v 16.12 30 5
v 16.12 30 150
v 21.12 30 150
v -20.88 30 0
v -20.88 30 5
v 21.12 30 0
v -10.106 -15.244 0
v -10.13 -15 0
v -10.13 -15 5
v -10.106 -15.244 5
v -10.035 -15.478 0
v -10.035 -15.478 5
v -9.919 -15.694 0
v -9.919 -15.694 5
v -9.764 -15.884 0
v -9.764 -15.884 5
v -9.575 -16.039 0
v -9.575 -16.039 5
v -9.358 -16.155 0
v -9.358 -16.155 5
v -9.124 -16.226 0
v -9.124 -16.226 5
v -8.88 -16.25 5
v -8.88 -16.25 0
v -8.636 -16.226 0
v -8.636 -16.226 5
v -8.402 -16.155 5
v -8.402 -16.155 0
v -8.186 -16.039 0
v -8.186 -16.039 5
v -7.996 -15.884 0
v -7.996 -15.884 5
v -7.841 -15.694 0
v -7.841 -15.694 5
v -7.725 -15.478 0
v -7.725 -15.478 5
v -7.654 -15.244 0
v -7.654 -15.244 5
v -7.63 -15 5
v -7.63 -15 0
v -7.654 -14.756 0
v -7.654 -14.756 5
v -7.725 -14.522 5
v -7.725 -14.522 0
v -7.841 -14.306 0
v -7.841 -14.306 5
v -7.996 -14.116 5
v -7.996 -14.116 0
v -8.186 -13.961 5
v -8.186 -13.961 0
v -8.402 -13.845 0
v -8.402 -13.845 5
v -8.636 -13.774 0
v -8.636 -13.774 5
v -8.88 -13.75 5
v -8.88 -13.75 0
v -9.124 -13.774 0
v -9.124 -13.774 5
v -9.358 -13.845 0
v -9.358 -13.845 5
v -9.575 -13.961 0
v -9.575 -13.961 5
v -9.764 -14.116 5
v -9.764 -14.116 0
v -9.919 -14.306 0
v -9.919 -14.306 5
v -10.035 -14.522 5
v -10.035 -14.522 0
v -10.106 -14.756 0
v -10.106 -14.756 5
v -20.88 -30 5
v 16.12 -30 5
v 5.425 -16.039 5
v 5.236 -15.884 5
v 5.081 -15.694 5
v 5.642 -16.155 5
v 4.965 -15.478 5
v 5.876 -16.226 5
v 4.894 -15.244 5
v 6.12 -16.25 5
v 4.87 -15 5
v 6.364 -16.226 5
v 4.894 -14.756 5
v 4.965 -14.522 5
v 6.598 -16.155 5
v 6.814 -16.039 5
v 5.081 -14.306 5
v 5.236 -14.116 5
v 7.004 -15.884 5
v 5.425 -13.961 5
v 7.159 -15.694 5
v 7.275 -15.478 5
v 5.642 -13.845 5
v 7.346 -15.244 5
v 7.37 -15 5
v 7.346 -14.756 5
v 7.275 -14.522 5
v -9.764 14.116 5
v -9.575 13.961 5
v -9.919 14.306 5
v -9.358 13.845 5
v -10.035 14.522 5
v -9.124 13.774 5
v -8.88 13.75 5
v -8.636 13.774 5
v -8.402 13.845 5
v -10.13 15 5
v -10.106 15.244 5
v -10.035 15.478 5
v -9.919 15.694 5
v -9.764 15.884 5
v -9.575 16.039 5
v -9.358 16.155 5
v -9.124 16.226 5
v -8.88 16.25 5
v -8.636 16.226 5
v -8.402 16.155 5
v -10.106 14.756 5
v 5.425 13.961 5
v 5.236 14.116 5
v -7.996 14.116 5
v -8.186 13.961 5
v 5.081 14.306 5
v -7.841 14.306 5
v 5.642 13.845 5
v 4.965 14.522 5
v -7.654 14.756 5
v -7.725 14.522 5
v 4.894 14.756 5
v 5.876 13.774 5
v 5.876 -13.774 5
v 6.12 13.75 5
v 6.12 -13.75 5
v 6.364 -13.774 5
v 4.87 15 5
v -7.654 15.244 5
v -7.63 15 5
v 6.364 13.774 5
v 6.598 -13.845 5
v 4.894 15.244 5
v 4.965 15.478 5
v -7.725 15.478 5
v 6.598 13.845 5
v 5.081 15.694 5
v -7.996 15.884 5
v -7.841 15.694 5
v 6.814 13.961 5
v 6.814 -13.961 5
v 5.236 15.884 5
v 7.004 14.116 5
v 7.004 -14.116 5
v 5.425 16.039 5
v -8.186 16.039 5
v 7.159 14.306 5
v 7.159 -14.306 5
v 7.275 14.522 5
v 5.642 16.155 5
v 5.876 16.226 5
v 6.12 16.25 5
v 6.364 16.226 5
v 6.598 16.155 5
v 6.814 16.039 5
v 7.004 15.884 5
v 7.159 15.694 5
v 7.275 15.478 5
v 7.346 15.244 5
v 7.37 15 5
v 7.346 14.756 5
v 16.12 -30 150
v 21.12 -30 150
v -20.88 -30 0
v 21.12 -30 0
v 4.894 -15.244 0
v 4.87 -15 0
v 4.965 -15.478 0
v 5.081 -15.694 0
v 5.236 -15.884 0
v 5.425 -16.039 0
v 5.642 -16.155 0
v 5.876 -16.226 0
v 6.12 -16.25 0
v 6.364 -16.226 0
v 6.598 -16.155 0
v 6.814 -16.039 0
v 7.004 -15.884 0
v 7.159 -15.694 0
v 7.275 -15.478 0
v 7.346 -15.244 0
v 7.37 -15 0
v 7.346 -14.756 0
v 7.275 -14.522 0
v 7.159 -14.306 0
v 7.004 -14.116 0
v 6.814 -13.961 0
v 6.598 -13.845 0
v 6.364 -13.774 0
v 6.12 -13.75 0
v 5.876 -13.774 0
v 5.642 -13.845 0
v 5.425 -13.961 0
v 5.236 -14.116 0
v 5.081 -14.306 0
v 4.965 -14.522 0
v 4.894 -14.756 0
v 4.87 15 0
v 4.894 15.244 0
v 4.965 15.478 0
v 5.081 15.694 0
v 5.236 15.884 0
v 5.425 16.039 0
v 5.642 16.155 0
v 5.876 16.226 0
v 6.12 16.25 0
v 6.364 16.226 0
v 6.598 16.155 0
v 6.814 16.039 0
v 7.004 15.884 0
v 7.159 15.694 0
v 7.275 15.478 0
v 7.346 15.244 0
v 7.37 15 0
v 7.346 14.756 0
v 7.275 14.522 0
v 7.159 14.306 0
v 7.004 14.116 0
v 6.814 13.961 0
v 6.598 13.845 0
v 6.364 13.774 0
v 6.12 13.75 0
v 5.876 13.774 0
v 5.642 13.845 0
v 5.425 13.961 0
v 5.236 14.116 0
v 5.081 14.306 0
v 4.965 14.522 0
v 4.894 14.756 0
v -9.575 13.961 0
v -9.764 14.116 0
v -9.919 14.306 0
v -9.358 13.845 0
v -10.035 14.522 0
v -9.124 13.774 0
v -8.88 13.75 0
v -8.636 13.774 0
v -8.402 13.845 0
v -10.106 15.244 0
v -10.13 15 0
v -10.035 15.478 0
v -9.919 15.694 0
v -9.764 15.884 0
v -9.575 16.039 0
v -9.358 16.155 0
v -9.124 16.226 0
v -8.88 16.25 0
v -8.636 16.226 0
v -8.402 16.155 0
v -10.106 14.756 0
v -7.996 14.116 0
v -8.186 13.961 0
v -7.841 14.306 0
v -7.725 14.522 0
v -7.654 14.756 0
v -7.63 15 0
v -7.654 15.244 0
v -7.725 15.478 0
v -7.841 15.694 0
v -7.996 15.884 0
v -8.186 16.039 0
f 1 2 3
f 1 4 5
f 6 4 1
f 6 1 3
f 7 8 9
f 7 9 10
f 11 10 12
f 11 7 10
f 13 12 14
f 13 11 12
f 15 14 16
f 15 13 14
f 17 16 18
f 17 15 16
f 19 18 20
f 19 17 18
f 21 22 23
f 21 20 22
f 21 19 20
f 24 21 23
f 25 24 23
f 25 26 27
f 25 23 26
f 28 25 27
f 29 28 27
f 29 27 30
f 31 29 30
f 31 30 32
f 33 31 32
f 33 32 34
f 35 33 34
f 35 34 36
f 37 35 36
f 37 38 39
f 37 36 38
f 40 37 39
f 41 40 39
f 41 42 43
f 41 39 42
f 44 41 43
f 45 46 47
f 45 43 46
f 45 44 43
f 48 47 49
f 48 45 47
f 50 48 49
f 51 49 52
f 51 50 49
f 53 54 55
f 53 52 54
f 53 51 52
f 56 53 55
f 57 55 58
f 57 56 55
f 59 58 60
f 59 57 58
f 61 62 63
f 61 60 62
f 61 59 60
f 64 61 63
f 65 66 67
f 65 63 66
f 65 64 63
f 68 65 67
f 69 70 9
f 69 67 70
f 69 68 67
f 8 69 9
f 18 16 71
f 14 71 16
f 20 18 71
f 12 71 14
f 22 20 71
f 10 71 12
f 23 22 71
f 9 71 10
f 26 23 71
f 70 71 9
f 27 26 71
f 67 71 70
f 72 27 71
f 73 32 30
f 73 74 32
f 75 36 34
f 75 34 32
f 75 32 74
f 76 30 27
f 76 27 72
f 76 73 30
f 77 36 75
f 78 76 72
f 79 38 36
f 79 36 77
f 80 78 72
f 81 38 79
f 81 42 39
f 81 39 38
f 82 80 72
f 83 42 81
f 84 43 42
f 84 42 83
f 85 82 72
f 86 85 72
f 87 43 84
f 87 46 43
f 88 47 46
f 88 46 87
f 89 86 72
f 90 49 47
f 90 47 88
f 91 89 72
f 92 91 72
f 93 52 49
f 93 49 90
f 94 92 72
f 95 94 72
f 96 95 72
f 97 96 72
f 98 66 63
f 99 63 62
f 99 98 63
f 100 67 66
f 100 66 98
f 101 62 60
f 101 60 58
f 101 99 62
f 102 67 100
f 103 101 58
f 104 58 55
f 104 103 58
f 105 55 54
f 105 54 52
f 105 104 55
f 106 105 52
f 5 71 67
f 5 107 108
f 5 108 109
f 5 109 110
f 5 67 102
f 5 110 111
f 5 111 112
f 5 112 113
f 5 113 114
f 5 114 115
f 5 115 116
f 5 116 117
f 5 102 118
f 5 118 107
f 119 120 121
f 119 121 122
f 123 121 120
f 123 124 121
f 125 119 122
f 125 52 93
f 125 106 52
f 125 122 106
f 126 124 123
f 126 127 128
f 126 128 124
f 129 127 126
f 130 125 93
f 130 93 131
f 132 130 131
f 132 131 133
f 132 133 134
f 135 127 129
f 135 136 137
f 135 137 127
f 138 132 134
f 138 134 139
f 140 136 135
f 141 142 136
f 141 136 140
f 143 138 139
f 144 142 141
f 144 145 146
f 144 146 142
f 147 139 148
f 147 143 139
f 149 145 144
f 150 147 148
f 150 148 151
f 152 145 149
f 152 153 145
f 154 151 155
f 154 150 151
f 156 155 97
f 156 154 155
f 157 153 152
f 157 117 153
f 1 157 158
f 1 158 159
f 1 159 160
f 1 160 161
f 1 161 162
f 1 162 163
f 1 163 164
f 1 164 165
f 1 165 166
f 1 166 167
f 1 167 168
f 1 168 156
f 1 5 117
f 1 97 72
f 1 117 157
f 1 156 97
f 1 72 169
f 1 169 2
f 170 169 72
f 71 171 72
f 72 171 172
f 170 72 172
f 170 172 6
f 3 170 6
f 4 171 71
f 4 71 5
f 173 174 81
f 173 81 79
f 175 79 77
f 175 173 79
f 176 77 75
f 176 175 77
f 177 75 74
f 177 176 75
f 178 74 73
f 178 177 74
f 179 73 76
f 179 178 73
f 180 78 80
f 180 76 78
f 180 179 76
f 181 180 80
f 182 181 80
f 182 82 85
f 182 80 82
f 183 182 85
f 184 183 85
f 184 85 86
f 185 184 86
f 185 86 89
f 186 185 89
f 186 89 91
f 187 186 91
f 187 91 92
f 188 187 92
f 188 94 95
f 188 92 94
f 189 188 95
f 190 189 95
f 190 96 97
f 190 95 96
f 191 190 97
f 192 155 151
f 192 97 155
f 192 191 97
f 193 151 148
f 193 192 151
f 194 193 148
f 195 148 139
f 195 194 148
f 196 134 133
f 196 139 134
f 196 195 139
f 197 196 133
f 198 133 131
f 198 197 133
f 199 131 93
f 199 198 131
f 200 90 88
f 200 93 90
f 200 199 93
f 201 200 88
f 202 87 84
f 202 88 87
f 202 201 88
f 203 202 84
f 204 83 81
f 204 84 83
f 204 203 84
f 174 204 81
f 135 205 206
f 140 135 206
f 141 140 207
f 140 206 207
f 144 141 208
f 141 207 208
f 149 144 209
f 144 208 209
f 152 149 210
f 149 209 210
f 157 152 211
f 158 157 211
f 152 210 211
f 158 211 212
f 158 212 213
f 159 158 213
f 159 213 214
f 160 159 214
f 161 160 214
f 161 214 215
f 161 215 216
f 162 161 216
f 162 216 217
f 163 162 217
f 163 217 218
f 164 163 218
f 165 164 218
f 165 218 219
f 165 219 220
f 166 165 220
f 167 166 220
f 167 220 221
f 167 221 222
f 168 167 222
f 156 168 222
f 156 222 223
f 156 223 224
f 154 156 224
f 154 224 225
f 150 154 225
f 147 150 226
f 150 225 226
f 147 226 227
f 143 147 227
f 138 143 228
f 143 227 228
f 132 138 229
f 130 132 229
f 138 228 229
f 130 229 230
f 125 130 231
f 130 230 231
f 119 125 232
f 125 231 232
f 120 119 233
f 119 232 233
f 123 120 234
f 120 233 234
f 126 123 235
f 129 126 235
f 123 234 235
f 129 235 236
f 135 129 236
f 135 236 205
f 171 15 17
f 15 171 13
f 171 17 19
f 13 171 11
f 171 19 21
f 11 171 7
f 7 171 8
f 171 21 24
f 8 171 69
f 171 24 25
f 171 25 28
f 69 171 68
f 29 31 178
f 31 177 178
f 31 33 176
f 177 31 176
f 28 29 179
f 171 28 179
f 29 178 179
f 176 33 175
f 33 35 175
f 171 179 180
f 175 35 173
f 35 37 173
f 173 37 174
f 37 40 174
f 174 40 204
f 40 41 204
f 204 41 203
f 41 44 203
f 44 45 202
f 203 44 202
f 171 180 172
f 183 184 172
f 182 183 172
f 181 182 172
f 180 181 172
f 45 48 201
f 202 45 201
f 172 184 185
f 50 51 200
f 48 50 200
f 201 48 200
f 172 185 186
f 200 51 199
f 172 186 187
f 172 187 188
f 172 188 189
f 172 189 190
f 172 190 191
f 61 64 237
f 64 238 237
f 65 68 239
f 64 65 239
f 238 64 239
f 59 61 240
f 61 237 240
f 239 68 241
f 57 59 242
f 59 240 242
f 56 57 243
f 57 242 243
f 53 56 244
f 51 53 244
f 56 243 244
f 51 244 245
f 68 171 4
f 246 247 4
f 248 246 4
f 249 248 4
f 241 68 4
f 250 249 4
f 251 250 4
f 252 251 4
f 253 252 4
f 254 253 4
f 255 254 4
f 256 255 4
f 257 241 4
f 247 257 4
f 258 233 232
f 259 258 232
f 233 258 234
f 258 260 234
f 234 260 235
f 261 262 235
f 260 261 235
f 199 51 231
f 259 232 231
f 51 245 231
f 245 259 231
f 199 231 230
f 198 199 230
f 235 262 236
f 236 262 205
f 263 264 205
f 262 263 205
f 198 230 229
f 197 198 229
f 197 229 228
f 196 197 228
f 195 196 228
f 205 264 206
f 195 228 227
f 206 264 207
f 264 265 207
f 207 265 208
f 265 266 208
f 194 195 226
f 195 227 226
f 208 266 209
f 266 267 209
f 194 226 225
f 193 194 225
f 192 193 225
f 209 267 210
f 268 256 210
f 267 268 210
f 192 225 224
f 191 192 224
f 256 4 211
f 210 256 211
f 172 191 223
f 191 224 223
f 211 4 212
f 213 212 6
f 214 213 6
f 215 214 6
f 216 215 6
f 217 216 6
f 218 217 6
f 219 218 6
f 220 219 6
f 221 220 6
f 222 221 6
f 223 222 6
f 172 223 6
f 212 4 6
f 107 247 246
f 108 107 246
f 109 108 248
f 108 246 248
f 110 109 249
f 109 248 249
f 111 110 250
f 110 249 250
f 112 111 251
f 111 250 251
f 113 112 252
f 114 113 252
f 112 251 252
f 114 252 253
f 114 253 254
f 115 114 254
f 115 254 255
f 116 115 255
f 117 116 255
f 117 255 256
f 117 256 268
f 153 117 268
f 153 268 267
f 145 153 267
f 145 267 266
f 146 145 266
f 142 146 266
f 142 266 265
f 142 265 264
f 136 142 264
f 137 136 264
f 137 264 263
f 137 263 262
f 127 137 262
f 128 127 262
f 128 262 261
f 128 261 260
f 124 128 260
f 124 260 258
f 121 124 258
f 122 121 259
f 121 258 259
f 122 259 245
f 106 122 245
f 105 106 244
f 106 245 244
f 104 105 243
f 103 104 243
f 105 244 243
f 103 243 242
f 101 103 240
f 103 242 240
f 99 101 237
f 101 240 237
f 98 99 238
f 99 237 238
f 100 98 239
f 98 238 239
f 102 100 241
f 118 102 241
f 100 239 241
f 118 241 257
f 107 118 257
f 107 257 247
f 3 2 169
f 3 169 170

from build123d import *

# Parameters (mm, degrees)
SKETCH_1_W         = 37
SKETCH_1_H         = 60
EXTRUDE_1_DEPTH    = 5
SKETCH_1_3_W       = 5
SKETCH_1_3_H       = 60
EXTRUDE_2_DEPTH    = 150
HOLE_WIZARD_M3_1_D = 2.5


with BuildPart() as part:
    # 草图1 → 凸台-拉伸1 (new body)
    with BuildSketch(Plane.XY):
        with Locations((-2.380104714, 0)):
            Rectangle(SKETCH_1_W, SKETCH_1_H)
    extrude(amount=EXTRUDE_1_DEPTH)

    # 草图1<3> → 凸台-拉伸2 (add)
    with BuildSketch(Plane.XY):
        with Locations((18.619895286, 0)):
            Rectangle(SKETCH_1_3_W, SKETCH_1_3_H)
    extrude(amount=EXTRUDE_2_DEPTH)

    # M3 螺纹孔的螺纹孔钻头1 (through all)
    with Locations(Plane(origin=(-8.880104714, 15, 5), x_dir=(1, 0, 0), z_dir=(0, 0, 1))):
        with Locations((0, 0), (15, 0)):
            hole_wizard_m3_1 = Hole(HOLE_WIZARD_M3_1_D / 2)

    # 镜向1: M3 螺纹孔的螺纹孔钻头1 across plane
    add(hole_wizard_m3_1.mirror(Plane.ZX), mode=Mode.SUBTRACT)


solid = part.part
